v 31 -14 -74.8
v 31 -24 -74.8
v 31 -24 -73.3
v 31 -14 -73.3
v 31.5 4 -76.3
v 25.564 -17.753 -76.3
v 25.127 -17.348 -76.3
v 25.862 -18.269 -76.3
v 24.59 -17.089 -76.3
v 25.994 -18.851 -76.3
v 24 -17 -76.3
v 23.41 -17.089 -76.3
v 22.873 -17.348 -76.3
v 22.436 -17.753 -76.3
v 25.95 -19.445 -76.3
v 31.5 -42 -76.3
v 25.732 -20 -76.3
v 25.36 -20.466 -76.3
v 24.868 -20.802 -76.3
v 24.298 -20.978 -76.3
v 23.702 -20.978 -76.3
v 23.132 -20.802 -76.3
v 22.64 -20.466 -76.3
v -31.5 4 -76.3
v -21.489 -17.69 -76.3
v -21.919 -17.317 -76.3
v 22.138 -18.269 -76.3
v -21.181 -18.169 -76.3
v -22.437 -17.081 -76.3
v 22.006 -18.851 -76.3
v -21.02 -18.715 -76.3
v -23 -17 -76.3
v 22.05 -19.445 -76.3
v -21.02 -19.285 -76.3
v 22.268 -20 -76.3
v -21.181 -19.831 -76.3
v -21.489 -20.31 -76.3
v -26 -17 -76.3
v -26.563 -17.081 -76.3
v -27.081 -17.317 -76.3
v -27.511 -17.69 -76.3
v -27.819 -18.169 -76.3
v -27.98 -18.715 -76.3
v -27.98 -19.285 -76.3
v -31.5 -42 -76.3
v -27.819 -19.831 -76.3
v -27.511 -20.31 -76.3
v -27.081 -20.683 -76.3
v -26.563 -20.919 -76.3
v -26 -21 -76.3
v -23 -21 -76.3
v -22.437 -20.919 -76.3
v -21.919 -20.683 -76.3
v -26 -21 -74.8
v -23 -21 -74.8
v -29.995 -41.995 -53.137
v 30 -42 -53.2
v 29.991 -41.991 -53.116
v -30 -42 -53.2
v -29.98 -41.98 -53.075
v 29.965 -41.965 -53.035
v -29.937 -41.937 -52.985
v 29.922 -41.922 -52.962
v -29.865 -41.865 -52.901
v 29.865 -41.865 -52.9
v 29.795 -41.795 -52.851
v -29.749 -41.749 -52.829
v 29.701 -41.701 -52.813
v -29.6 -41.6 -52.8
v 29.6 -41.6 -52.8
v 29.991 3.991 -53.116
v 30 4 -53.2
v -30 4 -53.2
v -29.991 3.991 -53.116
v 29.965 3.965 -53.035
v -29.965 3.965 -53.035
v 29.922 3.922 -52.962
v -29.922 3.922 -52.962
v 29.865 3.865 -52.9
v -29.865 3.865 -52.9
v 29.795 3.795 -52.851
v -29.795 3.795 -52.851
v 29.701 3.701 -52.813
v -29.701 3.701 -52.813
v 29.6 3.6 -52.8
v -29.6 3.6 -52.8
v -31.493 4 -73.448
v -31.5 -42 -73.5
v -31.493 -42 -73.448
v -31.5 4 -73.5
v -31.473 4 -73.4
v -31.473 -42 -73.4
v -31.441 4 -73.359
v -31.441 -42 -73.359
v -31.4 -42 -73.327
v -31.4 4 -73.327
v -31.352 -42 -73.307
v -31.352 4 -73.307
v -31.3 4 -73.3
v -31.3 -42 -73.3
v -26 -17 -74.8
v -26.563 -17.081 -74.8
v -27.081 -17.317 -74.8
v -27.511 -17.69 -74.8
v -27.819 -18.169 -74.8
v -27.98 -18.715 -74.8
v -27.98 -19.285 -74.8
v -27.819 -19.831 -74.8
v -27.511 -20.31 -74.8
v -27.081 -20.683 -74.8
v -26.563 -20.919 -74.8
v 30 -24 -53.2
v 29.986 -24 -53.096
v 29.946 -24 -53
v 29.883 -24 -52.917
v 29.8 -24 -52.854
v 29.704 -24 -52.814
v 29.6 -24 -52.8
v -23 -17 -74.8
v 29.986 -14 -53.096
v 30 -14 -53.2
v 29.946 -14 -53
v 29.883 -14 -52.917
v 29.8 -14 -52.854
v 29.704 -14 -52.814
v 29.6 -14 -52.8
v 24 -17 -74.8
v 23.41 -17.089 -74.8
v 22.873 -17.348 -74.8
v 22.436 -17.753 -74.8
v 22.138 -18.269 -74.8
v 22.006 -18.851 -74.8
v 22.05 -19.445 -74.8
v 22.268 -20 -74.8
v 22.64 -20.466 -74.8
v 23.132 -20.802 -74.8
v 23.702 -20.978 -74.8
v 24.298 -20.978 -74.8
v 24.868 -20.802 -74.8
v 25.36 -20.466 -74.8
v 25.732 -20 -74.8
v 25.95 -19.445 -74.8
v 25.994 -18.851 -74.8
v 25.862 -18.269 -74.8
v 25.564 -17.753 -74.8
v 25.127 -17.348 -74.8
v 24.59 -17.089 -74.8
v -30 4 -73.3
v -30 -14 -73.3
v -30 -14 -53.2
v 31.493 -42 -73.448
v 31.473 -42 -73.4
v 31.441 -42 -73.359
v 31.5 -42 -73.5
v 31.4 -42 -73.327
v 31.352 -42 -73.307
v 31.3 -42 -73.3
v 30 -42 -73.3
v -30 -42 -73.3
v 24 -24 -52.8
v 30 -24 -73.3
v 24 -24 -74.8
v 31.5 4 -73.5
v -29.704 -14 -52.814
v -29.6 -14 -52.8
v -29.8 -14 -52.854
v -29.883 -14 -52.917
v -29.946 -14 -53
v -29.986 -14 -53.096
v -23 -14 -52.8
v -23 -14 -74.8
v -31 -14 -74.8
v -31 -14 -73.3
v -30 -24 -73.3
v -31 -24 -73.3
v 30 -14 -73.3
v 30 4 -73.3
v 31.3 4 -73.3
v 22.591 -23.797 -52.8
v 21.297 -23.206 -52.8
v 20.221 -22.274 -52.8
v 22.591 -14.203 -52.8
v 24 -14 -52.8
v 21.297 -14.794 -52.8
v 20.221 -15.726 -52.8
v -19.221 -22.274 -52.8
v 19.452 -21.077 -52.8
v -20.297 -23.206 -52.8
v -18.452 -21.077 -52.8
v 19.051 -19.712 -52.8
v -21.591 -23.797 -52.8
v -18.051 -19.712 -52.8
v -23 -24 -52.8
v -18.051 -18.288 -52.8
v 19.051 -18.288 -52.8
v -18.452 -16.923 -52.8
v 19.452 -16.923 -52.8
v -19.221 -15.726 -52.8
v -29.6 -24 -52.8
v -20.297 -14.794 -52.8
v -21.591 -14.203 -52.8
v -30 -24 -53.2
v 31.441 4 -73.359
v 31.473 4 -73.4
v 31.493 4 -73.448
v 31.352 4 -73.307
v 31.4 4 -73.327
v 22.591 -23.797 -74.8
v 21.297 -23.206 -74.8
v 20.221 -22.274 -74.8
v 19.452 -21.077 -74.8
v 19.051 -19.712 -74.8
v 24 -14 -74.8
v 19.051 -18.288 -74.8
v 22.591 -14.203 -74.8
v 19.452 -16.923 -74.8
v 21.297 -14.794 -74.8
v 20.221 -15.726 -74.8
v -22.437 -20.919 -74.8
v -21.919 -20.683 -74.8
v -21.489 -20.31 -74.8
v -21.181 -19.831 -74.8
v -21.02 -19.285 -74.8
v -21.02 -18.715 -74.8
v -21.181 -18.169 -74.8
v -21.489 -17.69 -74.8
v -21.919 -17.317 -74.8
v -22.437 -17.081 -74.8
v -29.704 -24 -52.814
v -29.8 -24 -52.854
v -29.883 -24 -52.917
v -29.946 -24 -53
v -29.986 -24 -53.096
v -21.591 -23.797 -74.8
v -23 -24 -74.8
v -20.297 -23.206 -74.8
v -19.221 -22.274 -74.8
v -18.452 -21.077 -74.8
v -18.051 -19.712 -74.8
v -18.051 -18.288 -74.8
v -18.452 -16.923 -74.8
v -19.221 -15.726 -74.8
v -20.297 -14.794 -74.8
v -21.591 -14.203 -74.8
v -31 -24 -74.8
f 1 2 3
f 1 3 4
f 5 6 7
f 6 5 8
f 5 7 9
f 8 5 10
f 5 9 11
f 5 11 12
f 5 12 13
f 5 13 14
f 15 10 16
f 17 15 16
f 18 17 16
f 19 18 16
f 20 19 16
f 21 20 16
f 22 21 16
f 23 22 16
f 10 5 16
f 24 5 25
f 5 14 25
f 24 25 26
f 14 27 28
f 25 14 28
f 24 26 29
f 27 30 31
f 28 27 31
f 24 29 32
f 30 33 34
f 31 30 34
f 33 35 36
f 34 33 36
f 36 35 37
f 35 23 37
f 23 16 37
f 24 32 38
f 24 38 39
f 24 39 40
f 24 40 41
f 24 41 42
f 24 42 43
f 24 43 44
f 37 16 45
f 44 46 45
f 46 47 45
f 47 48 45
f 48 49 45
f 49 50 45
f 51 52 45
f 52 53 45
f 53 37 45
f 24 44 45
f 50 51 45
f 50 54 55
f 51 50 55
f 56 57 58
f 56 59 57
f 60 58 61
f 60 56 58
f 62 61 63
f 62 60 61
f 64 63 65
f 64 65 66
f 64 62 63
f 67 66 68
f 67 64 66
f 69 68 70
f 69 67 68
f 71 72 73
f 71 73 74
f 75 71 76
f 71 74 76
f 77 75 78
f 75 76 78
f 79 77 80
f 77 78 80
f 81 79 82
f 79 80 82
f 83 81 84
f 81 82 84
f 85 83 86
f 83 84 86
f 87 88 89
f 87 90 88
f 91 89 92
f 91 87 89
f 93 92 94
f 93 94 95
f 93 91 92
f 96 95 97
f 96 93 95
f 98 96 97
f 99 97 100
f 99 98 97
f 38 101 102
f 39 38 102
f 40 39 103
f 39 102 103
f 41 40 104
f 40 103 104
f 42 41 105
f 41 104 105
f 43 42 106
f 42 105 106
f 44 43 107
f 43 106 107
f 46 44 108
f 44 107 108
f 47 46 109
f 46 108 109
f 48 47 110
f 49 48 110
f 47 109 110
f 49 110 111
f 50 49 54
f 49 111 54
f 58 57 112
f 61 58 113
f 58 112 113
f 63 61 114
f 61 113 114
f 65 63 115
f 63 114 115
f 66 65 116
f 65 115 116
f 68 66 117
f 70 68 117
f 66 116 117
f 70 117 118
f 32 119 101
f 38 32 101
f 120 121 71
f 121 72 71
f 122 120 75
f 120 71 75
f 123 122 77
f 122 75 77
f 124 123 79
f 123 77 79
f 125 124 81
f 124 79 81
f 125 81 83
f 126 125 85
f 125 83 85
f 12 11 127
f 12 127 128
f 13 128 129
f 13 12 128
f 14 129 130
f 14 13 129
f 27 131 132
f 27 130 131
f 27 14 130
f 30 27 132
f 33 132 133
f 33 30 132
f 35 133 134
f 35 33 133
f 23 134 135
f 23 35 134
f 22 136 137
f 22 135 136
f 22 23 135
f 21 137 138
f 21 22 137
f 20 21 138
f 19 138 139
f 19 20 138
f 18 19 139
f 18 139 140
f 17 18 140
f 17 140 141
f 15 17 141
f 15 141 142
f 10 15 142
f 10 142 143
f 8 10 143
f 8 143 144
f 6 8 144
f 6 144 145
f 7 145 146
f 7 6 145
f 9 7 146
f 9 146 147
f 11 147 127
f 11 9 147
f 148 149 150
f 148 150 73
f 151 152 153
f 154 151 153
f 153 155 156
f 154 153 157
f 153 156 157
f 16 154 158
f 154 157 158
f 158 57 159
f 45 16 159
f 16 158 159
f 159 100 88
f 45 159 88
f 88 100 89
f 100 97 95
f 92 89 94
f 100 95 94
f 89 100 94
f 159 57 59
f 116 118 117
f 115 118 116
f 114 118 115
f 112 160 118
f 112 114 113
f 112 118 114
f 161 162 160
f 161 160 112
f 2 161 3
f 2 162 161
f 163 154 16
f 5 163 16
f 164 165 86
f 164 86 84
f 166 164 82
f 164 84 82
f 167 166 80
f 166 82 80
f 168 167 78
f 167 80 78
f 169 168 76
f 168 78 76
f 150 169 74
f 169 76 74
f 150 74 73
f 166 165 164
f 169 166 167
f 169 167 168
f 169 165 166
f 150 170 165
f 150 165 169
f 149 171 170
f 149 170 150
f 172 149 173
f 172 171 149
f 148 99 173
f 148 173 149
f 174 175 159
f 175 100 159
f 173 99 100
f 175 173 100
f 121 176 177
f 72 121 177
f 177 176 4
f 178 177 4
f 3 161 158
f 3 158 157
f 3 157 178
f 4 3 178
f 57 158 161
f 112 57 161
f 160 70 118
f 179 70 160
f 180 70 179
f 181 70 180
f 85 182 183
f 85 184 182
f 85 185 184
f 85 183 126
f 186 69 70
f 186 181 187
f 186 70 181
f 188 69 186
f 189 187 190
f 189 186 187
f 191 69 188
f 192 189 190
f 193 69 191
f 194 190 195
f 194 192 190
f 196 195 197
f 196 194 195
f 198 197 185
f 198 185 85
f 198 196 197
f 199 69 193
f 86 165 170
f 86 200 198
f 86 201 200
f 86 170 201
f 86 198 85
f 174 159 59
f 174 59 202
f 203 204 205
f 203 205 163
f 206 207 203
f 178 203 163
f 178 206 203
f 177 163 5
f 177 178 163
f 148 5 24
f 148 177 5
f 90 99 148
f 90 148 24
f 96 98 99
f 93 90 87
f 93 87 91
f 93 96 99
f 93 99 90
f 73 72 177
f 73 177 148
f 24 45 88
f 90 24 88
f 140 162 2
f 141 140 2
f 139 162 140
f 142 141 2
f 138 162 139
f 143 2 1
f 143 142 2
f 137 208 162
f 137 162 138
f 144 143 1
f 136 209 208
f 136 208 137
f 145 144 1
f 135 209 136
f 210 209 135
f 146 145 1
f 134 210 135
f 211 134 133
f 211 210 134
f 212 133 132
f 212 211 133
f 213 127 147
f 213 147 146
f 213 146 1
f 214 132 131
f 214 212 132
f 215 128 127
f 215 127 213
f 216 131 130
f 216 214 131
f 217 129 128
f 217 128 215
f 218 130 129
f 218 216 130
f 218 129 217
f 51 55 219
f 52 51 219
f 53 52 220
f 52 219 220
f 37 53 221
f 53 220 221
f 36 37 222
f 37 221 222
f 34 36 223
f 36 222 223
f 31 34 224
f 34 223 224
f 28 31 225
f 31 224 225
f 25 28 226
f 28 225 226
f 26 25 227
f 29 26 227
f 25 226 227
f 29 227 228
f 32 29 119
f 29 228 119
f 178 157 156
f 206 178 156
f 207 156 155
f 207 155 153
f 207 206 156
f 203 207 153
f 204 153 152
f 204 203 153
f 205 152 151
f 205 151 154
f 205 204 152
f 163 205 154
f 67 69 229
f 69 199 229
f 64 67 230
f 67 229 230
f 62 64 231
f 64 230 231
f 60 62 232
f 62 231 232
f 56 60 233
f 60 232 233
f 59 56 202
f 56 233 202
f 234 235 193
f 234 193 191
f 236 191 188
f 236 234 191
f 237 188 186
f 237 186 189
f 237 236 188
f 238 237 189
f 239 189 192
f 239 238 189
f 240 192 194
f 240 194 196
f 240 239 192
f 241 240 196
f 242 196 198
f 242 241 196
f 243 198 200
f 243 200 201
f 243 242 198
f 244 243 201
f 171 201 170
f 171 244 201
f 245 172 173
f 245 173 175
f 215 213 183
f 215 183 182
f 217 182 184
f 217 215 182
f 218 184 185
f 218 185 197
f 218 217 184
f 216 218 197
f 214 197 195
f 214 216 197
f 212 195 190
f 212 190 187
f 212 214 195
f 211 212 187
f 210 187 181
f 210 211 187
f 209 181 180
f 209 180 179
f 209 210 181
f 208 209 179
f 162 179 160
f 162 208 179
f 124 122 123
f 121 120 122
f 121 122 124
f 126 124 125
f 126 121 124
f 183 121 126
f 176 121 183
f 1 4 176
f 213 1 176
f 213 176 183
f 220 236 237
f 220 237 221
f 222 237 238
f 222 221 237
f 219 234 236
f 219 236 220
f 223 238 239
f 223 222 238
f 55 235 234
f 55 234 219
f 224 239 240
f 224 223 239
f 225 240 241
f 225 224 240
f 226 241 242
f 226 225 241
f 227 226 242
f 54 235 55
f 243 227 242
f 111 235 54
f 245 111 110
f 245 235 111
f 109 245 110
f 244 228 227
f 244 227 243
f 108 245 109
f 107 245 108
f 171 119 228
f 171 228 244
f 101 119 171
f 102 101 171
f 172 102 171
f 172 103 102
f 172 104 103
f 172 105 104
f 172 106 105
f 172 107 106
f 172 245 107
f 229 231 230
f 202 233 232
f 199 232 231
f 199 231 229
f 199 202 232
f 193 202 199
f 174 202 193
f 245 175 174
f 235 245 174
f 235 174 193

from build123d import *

# Parameters (mm, degrees)
BOX007_W                = 46
BOX007_H                = 60
BOX007_DEPTH            = 22
PAD010_DEPTH            = 46
POCKET_DEPTH            = 22
POCKET001_DEPTH         = 22
CYLINDER_R              = 2
CYLINDER_DEPTH          = 4
POCKET002_DEPTH         = 2
FILLET002_R             = 0.2
FILLET003_R             = 0.4
BODY010_PLACEMENT_ANGLE = 90


with BuildPart() as part:
    # Box007 → Box007 (join)
    with BuildSketch(Plane.XY):
        with Locations((23, 30)):
            Rectangle(BOX007_W, BOX007_H)
    extrude(amount=BOX007_DEPTH)

    # Sketch012 → Pad010 (join)
    with BuildSketch(Plane.YZ):
        Polygon((0, 1.5), (-1.5, 1.5), (-1.5, -1.5), (61.5, -1.5), (61.5, 1.5), (60, 1.5), (60, 0), (0, 0), align=None)
    extrude(amount=PAD010_DEPTH)

    # Sketch013 → Pocket (cut)
    with BuildSketch(Plane.XY):
        with BuildLine():
            ThreePointArc((28, 6), (23, 11), (18, 6))
            Line((18, 6), (18, -1))
            Line((18, -1), (28, -1))
            Line((28, -1), (28, 6))
        make_face()
    extrude(amount=POCKET_DEPTH, mode=Mode.SUBTRACT)

    # Sketch014 → Pocket001 (cut)
    with BuildSketch(Plane.XY):
        with BuildLine():
            ThreePointArc((18, 53), (23, 48), (28, 53))
            Line((28, 53), (28, 61))
            Line((28, 61), (18, 61))
            Line((18, 61), (18, 53))
        make_face()
    extrude(amount=POCKET001_DEPTH, mode=Mode.SUBTRACT)

    # Cylinder → Cylinder (cut)
    with BuildSketch(Plane(origin=(23, 6, -2), x_dir=(1, 0, 0), z_dir=(0, 0, 1))):
        Circle(CYLINDER_R)
    extrude(amount=CYLINDER_DEPTH, mode=Mode.SUBTRACT)

    # Sketch015 → Pocket002 (cut, symmetric)
    with BuildSketch(Plane.XY):
        with BuildLine():
            ThreePointArc((25, 56), (23, 58), (21, 56))
            Line((21, 56), (21, 53))
            ThreePointArc((21, 53), (23, 51), (25, 53))
            Line((25, 53), (25, 56))
        make_face()
    extrude(amount=POCKET002_DEPTH, both=True, mode=Mode.SUBTRACT)

    # Fillet002
    fillet002_edges = [part.edges().sort_by_distance(p)[0] for p in [
        (23, -1.5, 1.5),
        (23, 61.5, 1.5),
    ]]
    fillet(fillet002_edges, radius=FILLET002_R)

    # Fillet003
    fillet003_edges = [part.edges().sort_by_distance(p)[0] for p in [
        (9, 0, 22),
        (37, 0, 22),
        (46, 30, 22),
        (37, 60, 22),
        (9, 60, 22),
        (0, 30, 22),
    ]]
    fillet(fillet003_edges, radius=FILLET003_R)


with BuildPart() as part_1:
    # Body010 placement: moved
    add(part.part.moved(Location((30, -42, -74.8))).rotate(Axis((30, -42, -74.8), (0, 0, 1)), BODY010_PLACEMENT_ANGLE))


solid = part_1.part
